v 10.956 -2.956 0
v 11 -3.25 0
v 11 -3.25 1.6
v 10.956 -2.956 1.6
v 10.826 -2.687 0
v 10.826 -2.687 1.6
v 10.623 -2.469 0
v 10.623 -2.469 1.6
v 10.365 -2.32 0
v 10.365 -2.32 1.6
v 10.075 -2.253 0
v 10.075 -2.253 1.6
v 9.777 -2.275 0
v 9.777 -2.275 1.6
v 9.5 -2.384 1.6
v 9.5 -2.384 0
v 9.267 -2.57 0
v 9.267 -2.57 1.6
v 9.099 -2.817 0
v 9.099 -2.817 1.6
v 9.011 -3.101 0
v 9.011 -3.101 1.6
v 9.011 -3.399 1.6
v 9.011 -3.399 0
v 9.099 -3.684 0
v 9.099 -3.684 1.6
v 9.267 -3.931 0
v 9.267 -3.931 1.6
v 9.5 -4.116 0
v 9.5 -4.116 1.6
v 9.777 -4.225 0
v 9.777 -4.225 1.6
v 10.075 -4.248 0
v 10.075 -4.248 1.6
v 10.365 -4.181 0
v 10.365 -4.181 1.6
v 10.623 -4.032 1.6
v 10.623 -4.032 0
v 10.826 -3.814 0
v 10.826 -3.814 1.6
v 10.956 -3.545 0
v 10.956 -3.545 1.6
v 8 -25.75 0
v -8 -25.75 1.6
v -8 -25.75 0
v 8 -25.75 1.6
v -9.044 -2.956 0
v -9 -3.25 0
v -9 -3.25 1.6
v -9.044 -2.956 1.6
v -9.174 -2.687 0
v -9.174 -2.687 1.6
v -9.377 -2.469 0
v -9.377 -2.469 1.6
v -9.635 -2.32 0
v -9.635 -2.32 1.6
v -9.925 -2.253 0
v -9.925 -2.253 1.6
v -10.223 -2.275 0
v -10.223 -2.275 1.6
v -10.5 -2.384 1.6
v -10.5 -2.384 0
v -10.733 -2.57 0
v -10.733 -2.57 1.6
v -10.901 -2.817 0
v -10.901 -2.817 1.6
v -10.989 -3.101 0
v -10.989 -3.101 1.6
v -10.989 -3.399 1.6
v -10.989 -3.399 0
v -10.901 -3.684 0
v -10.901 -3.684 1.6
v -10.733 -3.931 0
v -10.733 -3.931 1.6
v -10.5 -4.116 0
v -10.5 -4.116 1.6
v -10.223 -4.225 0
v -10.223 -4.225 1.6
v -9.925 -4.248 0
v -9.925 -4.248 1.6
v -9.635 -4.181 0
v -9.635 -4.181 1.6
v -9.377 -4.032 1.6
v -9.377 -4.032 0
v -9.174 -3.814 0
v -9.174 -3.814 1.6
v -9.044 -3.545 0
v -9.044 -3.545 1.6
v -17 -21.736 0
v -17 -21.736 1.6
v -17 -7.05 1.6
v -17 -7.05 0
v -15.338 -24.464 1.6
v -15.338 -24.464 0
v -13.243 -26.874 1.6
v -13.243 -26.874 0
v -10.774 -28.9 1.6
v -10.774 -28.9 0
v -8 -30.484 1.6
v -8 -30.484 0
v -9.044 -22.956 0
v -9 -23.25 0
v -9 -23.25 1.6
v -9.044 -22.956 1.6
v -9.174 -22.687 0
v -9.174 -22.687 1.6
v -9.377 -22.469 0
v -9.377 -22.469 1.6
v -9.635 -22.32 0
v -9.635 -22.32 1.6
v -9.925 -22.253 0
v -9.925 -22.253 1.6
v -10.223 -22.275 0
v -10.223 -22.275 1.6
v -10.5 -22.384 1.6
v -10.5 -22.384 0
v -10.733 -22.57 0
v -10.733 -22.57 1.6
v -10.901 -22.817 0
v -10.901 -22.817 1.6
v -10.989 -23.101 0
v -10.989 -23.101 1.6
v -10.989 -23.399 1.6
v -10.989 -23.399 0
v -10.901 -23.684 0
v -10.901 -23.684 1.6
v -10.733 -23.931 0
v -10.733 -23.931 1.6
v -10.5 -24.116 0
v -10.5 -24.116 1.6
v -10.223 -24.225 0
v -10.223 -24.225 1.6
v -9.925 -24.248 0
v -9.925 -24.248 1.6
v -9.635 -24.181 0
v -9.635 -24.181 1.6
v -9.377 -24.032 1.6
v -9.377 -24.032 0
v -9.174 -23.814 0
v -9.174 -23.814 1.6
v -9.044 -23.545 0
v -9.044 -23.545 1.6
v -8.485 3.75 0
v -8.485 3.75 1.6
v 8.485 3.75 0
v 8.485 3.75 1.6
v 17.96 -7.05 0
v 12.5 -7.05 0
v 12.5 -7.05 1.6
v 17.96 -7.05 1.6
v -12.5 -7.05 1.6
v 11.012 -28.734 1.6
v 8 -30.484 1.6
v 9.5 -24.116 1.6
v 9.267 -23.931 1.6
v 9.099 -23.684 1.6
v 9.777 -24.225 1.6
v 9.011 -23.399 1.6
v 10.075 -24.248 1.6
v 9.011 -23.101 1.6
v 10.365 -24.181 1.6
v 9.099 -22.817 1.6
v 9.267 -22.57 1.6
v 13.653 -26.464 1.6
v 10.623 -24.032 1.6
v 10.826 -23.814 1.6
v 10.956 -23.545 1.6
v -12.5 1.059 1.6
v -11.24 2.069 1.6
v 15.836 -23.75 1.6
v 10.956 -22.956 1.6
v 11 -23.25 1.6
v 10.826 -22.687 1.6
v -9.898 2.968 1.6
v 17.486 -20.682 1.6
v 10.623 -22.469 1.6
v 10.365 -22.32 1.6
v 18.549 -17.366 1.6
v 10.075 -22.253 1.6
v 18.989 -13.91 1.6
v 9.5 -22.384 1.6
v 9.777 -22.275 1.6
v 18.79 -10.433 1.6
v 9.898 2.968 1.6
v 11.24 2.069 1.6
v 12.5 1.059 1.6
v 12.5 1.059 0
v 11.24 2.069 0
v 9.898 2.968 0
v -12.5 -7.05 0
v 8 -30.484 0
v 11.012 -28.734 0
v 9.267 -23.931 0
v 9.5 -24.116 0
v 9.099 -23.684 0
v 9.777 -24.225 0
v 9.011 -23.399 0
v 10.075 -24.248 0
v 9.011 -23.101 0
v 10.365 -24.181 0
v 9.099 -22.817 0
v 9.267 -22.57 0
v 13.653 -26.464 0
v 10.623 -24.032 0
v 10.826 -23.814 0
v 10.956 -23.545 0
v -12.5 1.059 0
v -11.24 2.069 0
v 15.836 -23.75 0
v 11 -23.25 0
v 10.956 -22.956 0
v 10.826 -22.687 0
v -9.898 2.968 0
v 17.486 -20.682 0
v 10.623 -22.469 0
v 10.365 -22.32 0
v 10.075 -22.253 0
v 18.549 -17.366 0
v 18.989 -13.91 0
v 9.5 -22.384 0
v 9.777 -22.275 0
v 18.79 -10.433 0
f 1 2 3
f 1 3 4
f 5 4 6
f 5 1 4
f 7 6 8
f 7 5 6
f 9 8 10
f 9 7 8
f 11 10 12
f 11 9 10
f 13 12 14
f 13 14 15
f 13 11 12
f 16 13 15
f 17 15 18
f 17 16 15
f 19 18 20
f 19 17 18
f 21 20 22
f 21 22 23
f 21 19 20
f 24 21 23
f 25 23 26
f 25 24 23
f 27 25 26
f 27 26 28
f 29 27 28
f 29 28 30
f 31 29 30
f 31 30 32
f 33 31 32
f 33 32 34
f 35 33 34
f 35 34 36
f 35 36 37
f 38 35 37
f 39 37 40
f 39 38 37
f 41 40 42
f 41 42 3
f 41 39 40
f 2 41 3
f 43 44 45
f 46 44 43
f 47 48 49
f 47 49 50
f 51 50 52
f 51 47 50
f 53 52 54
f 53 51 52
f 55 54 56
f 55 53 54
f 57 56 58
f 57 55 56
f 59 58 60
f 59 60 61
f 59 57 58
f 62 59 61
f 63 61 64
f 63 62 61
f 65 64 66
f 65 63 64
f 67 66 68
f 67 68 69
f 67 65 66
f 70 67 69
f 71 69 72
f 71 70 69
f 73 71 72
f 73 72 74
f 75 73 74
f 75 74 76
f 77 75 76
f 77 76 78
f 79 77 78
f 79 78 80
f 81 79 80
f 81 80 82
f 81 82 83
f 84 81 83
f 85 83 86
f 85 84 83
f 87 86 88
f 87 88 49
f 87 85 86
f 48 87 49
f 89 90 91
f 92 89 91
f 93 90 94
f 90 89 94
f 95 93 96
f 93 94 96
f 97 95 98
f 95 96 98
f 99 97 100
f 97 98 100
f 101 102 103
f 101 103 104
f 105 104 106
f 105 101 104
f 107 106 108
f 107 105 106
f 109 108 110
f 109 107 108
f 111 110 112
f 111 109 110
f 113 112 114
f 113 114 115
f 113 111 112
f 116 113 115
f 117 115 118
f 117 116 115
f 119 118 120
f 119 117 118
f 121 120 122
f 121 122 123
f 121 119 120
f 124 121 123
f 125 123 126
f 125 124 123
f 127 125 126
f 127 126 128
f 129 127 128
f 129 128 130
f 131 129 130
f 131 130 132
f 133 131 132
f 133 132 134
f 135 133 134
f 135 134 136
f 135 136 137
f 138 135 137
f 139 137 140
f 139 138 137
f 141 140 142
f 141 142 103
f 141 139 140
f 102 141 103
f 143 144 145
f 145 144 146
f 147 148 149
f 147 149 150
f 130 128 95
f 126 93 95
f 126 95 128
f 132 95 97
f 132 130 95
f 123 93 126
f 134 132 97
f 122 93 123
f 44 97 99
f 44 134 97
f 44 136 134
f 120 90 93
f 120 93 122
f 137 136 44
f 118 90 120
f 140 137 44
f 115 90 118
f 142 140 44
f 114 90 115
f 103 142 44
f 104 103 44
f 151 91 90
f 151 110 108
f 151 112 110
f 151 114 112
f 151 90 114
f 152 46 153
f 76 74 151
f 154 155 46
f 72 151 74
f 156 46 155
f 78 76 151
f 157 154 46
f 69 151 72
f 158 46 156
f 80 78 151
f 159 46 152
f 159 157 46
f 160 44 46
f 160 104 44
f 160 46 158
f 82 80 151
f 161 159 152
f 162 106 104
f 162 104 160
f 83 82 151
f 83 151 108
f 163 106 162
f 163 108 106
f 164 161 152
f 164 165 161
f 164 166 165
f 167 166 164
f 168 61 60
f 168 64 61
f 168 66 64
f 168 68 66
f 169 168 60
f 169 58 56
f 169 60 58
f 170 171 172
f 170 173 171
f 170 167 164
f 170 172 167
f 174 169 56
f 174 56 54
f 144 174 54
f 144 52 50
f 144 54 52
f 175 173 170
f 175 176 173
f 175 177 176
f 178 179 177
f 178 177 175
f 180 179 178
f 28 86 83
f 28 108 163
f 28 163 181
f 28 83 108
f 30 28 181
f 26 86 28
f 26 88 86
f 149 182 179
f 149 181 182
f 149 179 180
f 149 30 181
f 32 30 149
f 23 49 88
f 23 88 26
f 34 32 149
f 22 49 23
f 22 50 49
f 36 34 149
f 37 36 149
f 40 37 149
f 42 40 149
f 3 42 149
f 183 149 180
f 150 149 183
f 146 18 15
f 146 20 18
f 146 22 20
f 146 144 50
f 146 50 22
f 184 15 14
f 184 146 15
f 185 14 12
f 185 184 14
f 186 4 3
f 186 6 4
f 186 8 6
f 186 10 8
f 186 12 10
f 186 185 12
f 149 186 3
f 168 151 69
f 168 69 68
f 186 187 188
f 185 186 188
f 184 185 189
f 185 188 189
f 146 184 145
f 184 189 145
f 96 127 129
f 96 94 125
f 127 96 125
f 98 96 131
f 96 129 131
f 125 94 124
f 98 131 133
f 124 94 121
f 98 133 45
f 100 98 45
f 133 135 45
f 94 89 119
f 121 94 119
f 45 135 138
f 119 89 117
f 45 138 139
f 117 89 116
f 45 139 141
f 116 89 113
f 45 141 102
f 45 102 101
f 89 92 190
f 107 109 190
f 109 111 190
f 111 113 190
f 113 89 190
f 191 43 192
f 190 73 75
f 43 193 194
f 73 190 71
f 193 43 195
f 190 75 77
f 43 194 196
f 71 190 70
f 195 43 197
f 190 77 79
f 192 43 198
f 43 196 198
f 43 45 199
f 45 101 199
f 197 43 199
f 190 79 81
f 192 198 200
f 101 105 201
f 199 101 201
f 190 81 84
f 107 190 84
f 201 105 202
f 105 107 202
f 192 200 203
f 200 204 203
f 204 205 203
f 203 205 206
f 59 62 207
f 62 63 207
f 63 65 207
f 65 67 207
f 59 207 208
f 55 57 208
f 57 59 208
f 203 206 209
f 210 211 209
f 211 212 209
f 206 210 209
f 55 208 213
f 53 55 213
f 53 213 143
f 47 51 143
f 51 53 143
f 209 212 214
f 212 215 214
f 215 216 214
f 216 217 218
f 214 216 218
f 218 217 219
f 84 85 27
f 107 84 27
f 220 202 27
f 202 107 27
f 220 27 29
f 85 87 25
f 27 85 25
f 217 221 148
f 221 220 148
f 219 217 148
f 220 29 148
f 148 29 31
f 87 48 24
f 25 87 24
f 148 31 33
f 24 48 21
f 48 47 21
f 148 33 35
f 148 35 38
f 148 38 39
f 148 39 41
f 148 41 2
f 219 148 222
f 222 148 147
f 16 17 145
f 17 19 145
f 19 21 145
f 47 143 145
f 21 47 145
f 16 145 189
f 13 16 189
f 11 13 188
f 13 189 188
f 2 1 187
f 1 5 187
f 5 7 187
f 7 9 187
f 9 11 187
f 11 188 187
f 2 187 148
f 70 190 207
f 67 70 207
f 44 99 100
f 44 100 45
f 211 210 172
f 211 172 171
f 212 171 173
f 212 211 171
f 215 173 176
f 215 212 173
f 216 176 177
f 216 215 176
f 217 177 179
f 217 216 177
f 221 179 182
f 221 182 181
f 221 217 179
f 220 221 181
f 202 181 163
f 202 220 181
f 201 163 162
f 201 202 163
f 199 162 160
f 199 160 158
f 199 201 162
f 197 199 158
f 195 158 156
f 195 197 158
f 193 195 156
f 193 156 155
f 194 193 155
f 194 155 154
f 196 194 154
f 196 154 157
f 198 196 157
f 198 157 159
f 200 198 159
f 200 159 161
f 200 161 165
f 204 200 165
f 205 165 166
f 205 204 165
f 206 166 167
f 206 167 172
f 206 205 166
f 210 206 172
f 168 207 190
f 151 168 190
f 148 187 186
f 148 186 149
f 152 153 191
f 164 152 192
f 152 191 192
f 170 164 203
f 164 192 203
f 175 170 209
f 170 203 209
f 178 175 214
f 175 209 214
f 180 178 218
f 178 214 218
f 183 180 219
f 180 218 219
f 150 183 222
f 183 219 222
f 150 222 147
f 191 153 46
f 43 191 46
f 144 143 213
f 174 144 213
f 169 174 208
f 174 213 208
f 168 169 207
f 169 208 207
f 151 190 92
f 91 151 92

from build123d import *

# Parameters (mm, degrees)
SKETCH1_R           = 19
SKETCH1_R_2         = 1
BOSS_EXTRUDE1_DEPTH = 1.6
SKETCH2_W           = 16.970562748
SKETCH2_H           = 3.563360777
SKETCH2_W_2         = 5.149879678
SKETCH2_H_2         = 16.970562749
CUT_EXTRUDE1_DEPTH  = 1.6
CUT_EXTRUDE2_DEPTH  = 1.6
SKETCH4_W           = 16
SKETCH4_H           = 11.067837439
CUT_EXTRUDE3_DEPTH  = 1.6


with BuildPart() as part:
    # Sketch1 → Boss-Extrude1 (new body)
    with BuildSketch(Plane.XY):
        with Locations((0, -13.250389013)):
            Circle(SKETCH1_R)
        with Locations((-10, -3.250389013)):
            Circle(SKETCH1_R_2, mode=Mode.SUBTRACT)
        with Locations((10, -3.250389013)):
            Circle(SKETCH1_R_2, mode=Mode.SUBTRACT)
        with Locations((10, -23.250389013)):
            Circle(SKETCH1_R_2, mode=Mode.SUBTRACT)
        with Locations((-10, -23.250389013)):
            Circle(SKETCH1_R_2, mode=Mode.SUBTRACT)
    extrude(amount=BOSS_EXTRUDE1_DEPTH)

    # Sketch2 → Cut-Extrude1 (cut)
    with BuildSketch(Plane.XY.offset(1.6)):
        with Locations((0, 5.531291376)):
            Rectangle(SKETCH2_W, SKETCH2_H)
        with Locations((-19.574939839, -13.250389013)):
            Rectangle(SKETCH2_W_2, SKETCH2_H_2)
    extrude(amount=-CUT_EXTRUDE1_DEPTH, mode=Mode.SUBTRACT)

    # Sketch3 → Cut-Extrude2 (cut)
    with BuildSketch(Plane(origin=(0, 0, 0), x_dir=(-1, 0, 0), z_dir=(0, 0, -1))):
        Polygon((12.5, -5.150389013), (12.5, -7.050389013), (17, -7.050389013), (24.21815824, -7.050389013), (24.21815824, 1.058699009), (18.989854596, 1.058699009), (12.5, 1.058699009), align=None)
    cut_extrude2 = extrude(amount=-CUT_EXTRUDE2_DEPTH, mode=Mode.SUBTRACT)

    # Mirror1: Cut-Extrude2 across plane
    add(cut_extrude2.mirror(Plane(origin=(0, 0, 0), x_dir=(0, 0, 1), z_dir=(1, 0, 0))), mode=Mode.SUBTRACT)

    # Sketch4 → Cut-Extrude3 (cut)
    with BuildSketch(Plane.XY.offset(1.6)):
        with Locations((0, -31.284307733)):
            Rectangle(SKETCH4_W, SKETCH4_H)
    extrude(amount=-CUT_EXTRUDE3_DEPTH, mode=Mode.SUBTRACT)


solid = part.part
